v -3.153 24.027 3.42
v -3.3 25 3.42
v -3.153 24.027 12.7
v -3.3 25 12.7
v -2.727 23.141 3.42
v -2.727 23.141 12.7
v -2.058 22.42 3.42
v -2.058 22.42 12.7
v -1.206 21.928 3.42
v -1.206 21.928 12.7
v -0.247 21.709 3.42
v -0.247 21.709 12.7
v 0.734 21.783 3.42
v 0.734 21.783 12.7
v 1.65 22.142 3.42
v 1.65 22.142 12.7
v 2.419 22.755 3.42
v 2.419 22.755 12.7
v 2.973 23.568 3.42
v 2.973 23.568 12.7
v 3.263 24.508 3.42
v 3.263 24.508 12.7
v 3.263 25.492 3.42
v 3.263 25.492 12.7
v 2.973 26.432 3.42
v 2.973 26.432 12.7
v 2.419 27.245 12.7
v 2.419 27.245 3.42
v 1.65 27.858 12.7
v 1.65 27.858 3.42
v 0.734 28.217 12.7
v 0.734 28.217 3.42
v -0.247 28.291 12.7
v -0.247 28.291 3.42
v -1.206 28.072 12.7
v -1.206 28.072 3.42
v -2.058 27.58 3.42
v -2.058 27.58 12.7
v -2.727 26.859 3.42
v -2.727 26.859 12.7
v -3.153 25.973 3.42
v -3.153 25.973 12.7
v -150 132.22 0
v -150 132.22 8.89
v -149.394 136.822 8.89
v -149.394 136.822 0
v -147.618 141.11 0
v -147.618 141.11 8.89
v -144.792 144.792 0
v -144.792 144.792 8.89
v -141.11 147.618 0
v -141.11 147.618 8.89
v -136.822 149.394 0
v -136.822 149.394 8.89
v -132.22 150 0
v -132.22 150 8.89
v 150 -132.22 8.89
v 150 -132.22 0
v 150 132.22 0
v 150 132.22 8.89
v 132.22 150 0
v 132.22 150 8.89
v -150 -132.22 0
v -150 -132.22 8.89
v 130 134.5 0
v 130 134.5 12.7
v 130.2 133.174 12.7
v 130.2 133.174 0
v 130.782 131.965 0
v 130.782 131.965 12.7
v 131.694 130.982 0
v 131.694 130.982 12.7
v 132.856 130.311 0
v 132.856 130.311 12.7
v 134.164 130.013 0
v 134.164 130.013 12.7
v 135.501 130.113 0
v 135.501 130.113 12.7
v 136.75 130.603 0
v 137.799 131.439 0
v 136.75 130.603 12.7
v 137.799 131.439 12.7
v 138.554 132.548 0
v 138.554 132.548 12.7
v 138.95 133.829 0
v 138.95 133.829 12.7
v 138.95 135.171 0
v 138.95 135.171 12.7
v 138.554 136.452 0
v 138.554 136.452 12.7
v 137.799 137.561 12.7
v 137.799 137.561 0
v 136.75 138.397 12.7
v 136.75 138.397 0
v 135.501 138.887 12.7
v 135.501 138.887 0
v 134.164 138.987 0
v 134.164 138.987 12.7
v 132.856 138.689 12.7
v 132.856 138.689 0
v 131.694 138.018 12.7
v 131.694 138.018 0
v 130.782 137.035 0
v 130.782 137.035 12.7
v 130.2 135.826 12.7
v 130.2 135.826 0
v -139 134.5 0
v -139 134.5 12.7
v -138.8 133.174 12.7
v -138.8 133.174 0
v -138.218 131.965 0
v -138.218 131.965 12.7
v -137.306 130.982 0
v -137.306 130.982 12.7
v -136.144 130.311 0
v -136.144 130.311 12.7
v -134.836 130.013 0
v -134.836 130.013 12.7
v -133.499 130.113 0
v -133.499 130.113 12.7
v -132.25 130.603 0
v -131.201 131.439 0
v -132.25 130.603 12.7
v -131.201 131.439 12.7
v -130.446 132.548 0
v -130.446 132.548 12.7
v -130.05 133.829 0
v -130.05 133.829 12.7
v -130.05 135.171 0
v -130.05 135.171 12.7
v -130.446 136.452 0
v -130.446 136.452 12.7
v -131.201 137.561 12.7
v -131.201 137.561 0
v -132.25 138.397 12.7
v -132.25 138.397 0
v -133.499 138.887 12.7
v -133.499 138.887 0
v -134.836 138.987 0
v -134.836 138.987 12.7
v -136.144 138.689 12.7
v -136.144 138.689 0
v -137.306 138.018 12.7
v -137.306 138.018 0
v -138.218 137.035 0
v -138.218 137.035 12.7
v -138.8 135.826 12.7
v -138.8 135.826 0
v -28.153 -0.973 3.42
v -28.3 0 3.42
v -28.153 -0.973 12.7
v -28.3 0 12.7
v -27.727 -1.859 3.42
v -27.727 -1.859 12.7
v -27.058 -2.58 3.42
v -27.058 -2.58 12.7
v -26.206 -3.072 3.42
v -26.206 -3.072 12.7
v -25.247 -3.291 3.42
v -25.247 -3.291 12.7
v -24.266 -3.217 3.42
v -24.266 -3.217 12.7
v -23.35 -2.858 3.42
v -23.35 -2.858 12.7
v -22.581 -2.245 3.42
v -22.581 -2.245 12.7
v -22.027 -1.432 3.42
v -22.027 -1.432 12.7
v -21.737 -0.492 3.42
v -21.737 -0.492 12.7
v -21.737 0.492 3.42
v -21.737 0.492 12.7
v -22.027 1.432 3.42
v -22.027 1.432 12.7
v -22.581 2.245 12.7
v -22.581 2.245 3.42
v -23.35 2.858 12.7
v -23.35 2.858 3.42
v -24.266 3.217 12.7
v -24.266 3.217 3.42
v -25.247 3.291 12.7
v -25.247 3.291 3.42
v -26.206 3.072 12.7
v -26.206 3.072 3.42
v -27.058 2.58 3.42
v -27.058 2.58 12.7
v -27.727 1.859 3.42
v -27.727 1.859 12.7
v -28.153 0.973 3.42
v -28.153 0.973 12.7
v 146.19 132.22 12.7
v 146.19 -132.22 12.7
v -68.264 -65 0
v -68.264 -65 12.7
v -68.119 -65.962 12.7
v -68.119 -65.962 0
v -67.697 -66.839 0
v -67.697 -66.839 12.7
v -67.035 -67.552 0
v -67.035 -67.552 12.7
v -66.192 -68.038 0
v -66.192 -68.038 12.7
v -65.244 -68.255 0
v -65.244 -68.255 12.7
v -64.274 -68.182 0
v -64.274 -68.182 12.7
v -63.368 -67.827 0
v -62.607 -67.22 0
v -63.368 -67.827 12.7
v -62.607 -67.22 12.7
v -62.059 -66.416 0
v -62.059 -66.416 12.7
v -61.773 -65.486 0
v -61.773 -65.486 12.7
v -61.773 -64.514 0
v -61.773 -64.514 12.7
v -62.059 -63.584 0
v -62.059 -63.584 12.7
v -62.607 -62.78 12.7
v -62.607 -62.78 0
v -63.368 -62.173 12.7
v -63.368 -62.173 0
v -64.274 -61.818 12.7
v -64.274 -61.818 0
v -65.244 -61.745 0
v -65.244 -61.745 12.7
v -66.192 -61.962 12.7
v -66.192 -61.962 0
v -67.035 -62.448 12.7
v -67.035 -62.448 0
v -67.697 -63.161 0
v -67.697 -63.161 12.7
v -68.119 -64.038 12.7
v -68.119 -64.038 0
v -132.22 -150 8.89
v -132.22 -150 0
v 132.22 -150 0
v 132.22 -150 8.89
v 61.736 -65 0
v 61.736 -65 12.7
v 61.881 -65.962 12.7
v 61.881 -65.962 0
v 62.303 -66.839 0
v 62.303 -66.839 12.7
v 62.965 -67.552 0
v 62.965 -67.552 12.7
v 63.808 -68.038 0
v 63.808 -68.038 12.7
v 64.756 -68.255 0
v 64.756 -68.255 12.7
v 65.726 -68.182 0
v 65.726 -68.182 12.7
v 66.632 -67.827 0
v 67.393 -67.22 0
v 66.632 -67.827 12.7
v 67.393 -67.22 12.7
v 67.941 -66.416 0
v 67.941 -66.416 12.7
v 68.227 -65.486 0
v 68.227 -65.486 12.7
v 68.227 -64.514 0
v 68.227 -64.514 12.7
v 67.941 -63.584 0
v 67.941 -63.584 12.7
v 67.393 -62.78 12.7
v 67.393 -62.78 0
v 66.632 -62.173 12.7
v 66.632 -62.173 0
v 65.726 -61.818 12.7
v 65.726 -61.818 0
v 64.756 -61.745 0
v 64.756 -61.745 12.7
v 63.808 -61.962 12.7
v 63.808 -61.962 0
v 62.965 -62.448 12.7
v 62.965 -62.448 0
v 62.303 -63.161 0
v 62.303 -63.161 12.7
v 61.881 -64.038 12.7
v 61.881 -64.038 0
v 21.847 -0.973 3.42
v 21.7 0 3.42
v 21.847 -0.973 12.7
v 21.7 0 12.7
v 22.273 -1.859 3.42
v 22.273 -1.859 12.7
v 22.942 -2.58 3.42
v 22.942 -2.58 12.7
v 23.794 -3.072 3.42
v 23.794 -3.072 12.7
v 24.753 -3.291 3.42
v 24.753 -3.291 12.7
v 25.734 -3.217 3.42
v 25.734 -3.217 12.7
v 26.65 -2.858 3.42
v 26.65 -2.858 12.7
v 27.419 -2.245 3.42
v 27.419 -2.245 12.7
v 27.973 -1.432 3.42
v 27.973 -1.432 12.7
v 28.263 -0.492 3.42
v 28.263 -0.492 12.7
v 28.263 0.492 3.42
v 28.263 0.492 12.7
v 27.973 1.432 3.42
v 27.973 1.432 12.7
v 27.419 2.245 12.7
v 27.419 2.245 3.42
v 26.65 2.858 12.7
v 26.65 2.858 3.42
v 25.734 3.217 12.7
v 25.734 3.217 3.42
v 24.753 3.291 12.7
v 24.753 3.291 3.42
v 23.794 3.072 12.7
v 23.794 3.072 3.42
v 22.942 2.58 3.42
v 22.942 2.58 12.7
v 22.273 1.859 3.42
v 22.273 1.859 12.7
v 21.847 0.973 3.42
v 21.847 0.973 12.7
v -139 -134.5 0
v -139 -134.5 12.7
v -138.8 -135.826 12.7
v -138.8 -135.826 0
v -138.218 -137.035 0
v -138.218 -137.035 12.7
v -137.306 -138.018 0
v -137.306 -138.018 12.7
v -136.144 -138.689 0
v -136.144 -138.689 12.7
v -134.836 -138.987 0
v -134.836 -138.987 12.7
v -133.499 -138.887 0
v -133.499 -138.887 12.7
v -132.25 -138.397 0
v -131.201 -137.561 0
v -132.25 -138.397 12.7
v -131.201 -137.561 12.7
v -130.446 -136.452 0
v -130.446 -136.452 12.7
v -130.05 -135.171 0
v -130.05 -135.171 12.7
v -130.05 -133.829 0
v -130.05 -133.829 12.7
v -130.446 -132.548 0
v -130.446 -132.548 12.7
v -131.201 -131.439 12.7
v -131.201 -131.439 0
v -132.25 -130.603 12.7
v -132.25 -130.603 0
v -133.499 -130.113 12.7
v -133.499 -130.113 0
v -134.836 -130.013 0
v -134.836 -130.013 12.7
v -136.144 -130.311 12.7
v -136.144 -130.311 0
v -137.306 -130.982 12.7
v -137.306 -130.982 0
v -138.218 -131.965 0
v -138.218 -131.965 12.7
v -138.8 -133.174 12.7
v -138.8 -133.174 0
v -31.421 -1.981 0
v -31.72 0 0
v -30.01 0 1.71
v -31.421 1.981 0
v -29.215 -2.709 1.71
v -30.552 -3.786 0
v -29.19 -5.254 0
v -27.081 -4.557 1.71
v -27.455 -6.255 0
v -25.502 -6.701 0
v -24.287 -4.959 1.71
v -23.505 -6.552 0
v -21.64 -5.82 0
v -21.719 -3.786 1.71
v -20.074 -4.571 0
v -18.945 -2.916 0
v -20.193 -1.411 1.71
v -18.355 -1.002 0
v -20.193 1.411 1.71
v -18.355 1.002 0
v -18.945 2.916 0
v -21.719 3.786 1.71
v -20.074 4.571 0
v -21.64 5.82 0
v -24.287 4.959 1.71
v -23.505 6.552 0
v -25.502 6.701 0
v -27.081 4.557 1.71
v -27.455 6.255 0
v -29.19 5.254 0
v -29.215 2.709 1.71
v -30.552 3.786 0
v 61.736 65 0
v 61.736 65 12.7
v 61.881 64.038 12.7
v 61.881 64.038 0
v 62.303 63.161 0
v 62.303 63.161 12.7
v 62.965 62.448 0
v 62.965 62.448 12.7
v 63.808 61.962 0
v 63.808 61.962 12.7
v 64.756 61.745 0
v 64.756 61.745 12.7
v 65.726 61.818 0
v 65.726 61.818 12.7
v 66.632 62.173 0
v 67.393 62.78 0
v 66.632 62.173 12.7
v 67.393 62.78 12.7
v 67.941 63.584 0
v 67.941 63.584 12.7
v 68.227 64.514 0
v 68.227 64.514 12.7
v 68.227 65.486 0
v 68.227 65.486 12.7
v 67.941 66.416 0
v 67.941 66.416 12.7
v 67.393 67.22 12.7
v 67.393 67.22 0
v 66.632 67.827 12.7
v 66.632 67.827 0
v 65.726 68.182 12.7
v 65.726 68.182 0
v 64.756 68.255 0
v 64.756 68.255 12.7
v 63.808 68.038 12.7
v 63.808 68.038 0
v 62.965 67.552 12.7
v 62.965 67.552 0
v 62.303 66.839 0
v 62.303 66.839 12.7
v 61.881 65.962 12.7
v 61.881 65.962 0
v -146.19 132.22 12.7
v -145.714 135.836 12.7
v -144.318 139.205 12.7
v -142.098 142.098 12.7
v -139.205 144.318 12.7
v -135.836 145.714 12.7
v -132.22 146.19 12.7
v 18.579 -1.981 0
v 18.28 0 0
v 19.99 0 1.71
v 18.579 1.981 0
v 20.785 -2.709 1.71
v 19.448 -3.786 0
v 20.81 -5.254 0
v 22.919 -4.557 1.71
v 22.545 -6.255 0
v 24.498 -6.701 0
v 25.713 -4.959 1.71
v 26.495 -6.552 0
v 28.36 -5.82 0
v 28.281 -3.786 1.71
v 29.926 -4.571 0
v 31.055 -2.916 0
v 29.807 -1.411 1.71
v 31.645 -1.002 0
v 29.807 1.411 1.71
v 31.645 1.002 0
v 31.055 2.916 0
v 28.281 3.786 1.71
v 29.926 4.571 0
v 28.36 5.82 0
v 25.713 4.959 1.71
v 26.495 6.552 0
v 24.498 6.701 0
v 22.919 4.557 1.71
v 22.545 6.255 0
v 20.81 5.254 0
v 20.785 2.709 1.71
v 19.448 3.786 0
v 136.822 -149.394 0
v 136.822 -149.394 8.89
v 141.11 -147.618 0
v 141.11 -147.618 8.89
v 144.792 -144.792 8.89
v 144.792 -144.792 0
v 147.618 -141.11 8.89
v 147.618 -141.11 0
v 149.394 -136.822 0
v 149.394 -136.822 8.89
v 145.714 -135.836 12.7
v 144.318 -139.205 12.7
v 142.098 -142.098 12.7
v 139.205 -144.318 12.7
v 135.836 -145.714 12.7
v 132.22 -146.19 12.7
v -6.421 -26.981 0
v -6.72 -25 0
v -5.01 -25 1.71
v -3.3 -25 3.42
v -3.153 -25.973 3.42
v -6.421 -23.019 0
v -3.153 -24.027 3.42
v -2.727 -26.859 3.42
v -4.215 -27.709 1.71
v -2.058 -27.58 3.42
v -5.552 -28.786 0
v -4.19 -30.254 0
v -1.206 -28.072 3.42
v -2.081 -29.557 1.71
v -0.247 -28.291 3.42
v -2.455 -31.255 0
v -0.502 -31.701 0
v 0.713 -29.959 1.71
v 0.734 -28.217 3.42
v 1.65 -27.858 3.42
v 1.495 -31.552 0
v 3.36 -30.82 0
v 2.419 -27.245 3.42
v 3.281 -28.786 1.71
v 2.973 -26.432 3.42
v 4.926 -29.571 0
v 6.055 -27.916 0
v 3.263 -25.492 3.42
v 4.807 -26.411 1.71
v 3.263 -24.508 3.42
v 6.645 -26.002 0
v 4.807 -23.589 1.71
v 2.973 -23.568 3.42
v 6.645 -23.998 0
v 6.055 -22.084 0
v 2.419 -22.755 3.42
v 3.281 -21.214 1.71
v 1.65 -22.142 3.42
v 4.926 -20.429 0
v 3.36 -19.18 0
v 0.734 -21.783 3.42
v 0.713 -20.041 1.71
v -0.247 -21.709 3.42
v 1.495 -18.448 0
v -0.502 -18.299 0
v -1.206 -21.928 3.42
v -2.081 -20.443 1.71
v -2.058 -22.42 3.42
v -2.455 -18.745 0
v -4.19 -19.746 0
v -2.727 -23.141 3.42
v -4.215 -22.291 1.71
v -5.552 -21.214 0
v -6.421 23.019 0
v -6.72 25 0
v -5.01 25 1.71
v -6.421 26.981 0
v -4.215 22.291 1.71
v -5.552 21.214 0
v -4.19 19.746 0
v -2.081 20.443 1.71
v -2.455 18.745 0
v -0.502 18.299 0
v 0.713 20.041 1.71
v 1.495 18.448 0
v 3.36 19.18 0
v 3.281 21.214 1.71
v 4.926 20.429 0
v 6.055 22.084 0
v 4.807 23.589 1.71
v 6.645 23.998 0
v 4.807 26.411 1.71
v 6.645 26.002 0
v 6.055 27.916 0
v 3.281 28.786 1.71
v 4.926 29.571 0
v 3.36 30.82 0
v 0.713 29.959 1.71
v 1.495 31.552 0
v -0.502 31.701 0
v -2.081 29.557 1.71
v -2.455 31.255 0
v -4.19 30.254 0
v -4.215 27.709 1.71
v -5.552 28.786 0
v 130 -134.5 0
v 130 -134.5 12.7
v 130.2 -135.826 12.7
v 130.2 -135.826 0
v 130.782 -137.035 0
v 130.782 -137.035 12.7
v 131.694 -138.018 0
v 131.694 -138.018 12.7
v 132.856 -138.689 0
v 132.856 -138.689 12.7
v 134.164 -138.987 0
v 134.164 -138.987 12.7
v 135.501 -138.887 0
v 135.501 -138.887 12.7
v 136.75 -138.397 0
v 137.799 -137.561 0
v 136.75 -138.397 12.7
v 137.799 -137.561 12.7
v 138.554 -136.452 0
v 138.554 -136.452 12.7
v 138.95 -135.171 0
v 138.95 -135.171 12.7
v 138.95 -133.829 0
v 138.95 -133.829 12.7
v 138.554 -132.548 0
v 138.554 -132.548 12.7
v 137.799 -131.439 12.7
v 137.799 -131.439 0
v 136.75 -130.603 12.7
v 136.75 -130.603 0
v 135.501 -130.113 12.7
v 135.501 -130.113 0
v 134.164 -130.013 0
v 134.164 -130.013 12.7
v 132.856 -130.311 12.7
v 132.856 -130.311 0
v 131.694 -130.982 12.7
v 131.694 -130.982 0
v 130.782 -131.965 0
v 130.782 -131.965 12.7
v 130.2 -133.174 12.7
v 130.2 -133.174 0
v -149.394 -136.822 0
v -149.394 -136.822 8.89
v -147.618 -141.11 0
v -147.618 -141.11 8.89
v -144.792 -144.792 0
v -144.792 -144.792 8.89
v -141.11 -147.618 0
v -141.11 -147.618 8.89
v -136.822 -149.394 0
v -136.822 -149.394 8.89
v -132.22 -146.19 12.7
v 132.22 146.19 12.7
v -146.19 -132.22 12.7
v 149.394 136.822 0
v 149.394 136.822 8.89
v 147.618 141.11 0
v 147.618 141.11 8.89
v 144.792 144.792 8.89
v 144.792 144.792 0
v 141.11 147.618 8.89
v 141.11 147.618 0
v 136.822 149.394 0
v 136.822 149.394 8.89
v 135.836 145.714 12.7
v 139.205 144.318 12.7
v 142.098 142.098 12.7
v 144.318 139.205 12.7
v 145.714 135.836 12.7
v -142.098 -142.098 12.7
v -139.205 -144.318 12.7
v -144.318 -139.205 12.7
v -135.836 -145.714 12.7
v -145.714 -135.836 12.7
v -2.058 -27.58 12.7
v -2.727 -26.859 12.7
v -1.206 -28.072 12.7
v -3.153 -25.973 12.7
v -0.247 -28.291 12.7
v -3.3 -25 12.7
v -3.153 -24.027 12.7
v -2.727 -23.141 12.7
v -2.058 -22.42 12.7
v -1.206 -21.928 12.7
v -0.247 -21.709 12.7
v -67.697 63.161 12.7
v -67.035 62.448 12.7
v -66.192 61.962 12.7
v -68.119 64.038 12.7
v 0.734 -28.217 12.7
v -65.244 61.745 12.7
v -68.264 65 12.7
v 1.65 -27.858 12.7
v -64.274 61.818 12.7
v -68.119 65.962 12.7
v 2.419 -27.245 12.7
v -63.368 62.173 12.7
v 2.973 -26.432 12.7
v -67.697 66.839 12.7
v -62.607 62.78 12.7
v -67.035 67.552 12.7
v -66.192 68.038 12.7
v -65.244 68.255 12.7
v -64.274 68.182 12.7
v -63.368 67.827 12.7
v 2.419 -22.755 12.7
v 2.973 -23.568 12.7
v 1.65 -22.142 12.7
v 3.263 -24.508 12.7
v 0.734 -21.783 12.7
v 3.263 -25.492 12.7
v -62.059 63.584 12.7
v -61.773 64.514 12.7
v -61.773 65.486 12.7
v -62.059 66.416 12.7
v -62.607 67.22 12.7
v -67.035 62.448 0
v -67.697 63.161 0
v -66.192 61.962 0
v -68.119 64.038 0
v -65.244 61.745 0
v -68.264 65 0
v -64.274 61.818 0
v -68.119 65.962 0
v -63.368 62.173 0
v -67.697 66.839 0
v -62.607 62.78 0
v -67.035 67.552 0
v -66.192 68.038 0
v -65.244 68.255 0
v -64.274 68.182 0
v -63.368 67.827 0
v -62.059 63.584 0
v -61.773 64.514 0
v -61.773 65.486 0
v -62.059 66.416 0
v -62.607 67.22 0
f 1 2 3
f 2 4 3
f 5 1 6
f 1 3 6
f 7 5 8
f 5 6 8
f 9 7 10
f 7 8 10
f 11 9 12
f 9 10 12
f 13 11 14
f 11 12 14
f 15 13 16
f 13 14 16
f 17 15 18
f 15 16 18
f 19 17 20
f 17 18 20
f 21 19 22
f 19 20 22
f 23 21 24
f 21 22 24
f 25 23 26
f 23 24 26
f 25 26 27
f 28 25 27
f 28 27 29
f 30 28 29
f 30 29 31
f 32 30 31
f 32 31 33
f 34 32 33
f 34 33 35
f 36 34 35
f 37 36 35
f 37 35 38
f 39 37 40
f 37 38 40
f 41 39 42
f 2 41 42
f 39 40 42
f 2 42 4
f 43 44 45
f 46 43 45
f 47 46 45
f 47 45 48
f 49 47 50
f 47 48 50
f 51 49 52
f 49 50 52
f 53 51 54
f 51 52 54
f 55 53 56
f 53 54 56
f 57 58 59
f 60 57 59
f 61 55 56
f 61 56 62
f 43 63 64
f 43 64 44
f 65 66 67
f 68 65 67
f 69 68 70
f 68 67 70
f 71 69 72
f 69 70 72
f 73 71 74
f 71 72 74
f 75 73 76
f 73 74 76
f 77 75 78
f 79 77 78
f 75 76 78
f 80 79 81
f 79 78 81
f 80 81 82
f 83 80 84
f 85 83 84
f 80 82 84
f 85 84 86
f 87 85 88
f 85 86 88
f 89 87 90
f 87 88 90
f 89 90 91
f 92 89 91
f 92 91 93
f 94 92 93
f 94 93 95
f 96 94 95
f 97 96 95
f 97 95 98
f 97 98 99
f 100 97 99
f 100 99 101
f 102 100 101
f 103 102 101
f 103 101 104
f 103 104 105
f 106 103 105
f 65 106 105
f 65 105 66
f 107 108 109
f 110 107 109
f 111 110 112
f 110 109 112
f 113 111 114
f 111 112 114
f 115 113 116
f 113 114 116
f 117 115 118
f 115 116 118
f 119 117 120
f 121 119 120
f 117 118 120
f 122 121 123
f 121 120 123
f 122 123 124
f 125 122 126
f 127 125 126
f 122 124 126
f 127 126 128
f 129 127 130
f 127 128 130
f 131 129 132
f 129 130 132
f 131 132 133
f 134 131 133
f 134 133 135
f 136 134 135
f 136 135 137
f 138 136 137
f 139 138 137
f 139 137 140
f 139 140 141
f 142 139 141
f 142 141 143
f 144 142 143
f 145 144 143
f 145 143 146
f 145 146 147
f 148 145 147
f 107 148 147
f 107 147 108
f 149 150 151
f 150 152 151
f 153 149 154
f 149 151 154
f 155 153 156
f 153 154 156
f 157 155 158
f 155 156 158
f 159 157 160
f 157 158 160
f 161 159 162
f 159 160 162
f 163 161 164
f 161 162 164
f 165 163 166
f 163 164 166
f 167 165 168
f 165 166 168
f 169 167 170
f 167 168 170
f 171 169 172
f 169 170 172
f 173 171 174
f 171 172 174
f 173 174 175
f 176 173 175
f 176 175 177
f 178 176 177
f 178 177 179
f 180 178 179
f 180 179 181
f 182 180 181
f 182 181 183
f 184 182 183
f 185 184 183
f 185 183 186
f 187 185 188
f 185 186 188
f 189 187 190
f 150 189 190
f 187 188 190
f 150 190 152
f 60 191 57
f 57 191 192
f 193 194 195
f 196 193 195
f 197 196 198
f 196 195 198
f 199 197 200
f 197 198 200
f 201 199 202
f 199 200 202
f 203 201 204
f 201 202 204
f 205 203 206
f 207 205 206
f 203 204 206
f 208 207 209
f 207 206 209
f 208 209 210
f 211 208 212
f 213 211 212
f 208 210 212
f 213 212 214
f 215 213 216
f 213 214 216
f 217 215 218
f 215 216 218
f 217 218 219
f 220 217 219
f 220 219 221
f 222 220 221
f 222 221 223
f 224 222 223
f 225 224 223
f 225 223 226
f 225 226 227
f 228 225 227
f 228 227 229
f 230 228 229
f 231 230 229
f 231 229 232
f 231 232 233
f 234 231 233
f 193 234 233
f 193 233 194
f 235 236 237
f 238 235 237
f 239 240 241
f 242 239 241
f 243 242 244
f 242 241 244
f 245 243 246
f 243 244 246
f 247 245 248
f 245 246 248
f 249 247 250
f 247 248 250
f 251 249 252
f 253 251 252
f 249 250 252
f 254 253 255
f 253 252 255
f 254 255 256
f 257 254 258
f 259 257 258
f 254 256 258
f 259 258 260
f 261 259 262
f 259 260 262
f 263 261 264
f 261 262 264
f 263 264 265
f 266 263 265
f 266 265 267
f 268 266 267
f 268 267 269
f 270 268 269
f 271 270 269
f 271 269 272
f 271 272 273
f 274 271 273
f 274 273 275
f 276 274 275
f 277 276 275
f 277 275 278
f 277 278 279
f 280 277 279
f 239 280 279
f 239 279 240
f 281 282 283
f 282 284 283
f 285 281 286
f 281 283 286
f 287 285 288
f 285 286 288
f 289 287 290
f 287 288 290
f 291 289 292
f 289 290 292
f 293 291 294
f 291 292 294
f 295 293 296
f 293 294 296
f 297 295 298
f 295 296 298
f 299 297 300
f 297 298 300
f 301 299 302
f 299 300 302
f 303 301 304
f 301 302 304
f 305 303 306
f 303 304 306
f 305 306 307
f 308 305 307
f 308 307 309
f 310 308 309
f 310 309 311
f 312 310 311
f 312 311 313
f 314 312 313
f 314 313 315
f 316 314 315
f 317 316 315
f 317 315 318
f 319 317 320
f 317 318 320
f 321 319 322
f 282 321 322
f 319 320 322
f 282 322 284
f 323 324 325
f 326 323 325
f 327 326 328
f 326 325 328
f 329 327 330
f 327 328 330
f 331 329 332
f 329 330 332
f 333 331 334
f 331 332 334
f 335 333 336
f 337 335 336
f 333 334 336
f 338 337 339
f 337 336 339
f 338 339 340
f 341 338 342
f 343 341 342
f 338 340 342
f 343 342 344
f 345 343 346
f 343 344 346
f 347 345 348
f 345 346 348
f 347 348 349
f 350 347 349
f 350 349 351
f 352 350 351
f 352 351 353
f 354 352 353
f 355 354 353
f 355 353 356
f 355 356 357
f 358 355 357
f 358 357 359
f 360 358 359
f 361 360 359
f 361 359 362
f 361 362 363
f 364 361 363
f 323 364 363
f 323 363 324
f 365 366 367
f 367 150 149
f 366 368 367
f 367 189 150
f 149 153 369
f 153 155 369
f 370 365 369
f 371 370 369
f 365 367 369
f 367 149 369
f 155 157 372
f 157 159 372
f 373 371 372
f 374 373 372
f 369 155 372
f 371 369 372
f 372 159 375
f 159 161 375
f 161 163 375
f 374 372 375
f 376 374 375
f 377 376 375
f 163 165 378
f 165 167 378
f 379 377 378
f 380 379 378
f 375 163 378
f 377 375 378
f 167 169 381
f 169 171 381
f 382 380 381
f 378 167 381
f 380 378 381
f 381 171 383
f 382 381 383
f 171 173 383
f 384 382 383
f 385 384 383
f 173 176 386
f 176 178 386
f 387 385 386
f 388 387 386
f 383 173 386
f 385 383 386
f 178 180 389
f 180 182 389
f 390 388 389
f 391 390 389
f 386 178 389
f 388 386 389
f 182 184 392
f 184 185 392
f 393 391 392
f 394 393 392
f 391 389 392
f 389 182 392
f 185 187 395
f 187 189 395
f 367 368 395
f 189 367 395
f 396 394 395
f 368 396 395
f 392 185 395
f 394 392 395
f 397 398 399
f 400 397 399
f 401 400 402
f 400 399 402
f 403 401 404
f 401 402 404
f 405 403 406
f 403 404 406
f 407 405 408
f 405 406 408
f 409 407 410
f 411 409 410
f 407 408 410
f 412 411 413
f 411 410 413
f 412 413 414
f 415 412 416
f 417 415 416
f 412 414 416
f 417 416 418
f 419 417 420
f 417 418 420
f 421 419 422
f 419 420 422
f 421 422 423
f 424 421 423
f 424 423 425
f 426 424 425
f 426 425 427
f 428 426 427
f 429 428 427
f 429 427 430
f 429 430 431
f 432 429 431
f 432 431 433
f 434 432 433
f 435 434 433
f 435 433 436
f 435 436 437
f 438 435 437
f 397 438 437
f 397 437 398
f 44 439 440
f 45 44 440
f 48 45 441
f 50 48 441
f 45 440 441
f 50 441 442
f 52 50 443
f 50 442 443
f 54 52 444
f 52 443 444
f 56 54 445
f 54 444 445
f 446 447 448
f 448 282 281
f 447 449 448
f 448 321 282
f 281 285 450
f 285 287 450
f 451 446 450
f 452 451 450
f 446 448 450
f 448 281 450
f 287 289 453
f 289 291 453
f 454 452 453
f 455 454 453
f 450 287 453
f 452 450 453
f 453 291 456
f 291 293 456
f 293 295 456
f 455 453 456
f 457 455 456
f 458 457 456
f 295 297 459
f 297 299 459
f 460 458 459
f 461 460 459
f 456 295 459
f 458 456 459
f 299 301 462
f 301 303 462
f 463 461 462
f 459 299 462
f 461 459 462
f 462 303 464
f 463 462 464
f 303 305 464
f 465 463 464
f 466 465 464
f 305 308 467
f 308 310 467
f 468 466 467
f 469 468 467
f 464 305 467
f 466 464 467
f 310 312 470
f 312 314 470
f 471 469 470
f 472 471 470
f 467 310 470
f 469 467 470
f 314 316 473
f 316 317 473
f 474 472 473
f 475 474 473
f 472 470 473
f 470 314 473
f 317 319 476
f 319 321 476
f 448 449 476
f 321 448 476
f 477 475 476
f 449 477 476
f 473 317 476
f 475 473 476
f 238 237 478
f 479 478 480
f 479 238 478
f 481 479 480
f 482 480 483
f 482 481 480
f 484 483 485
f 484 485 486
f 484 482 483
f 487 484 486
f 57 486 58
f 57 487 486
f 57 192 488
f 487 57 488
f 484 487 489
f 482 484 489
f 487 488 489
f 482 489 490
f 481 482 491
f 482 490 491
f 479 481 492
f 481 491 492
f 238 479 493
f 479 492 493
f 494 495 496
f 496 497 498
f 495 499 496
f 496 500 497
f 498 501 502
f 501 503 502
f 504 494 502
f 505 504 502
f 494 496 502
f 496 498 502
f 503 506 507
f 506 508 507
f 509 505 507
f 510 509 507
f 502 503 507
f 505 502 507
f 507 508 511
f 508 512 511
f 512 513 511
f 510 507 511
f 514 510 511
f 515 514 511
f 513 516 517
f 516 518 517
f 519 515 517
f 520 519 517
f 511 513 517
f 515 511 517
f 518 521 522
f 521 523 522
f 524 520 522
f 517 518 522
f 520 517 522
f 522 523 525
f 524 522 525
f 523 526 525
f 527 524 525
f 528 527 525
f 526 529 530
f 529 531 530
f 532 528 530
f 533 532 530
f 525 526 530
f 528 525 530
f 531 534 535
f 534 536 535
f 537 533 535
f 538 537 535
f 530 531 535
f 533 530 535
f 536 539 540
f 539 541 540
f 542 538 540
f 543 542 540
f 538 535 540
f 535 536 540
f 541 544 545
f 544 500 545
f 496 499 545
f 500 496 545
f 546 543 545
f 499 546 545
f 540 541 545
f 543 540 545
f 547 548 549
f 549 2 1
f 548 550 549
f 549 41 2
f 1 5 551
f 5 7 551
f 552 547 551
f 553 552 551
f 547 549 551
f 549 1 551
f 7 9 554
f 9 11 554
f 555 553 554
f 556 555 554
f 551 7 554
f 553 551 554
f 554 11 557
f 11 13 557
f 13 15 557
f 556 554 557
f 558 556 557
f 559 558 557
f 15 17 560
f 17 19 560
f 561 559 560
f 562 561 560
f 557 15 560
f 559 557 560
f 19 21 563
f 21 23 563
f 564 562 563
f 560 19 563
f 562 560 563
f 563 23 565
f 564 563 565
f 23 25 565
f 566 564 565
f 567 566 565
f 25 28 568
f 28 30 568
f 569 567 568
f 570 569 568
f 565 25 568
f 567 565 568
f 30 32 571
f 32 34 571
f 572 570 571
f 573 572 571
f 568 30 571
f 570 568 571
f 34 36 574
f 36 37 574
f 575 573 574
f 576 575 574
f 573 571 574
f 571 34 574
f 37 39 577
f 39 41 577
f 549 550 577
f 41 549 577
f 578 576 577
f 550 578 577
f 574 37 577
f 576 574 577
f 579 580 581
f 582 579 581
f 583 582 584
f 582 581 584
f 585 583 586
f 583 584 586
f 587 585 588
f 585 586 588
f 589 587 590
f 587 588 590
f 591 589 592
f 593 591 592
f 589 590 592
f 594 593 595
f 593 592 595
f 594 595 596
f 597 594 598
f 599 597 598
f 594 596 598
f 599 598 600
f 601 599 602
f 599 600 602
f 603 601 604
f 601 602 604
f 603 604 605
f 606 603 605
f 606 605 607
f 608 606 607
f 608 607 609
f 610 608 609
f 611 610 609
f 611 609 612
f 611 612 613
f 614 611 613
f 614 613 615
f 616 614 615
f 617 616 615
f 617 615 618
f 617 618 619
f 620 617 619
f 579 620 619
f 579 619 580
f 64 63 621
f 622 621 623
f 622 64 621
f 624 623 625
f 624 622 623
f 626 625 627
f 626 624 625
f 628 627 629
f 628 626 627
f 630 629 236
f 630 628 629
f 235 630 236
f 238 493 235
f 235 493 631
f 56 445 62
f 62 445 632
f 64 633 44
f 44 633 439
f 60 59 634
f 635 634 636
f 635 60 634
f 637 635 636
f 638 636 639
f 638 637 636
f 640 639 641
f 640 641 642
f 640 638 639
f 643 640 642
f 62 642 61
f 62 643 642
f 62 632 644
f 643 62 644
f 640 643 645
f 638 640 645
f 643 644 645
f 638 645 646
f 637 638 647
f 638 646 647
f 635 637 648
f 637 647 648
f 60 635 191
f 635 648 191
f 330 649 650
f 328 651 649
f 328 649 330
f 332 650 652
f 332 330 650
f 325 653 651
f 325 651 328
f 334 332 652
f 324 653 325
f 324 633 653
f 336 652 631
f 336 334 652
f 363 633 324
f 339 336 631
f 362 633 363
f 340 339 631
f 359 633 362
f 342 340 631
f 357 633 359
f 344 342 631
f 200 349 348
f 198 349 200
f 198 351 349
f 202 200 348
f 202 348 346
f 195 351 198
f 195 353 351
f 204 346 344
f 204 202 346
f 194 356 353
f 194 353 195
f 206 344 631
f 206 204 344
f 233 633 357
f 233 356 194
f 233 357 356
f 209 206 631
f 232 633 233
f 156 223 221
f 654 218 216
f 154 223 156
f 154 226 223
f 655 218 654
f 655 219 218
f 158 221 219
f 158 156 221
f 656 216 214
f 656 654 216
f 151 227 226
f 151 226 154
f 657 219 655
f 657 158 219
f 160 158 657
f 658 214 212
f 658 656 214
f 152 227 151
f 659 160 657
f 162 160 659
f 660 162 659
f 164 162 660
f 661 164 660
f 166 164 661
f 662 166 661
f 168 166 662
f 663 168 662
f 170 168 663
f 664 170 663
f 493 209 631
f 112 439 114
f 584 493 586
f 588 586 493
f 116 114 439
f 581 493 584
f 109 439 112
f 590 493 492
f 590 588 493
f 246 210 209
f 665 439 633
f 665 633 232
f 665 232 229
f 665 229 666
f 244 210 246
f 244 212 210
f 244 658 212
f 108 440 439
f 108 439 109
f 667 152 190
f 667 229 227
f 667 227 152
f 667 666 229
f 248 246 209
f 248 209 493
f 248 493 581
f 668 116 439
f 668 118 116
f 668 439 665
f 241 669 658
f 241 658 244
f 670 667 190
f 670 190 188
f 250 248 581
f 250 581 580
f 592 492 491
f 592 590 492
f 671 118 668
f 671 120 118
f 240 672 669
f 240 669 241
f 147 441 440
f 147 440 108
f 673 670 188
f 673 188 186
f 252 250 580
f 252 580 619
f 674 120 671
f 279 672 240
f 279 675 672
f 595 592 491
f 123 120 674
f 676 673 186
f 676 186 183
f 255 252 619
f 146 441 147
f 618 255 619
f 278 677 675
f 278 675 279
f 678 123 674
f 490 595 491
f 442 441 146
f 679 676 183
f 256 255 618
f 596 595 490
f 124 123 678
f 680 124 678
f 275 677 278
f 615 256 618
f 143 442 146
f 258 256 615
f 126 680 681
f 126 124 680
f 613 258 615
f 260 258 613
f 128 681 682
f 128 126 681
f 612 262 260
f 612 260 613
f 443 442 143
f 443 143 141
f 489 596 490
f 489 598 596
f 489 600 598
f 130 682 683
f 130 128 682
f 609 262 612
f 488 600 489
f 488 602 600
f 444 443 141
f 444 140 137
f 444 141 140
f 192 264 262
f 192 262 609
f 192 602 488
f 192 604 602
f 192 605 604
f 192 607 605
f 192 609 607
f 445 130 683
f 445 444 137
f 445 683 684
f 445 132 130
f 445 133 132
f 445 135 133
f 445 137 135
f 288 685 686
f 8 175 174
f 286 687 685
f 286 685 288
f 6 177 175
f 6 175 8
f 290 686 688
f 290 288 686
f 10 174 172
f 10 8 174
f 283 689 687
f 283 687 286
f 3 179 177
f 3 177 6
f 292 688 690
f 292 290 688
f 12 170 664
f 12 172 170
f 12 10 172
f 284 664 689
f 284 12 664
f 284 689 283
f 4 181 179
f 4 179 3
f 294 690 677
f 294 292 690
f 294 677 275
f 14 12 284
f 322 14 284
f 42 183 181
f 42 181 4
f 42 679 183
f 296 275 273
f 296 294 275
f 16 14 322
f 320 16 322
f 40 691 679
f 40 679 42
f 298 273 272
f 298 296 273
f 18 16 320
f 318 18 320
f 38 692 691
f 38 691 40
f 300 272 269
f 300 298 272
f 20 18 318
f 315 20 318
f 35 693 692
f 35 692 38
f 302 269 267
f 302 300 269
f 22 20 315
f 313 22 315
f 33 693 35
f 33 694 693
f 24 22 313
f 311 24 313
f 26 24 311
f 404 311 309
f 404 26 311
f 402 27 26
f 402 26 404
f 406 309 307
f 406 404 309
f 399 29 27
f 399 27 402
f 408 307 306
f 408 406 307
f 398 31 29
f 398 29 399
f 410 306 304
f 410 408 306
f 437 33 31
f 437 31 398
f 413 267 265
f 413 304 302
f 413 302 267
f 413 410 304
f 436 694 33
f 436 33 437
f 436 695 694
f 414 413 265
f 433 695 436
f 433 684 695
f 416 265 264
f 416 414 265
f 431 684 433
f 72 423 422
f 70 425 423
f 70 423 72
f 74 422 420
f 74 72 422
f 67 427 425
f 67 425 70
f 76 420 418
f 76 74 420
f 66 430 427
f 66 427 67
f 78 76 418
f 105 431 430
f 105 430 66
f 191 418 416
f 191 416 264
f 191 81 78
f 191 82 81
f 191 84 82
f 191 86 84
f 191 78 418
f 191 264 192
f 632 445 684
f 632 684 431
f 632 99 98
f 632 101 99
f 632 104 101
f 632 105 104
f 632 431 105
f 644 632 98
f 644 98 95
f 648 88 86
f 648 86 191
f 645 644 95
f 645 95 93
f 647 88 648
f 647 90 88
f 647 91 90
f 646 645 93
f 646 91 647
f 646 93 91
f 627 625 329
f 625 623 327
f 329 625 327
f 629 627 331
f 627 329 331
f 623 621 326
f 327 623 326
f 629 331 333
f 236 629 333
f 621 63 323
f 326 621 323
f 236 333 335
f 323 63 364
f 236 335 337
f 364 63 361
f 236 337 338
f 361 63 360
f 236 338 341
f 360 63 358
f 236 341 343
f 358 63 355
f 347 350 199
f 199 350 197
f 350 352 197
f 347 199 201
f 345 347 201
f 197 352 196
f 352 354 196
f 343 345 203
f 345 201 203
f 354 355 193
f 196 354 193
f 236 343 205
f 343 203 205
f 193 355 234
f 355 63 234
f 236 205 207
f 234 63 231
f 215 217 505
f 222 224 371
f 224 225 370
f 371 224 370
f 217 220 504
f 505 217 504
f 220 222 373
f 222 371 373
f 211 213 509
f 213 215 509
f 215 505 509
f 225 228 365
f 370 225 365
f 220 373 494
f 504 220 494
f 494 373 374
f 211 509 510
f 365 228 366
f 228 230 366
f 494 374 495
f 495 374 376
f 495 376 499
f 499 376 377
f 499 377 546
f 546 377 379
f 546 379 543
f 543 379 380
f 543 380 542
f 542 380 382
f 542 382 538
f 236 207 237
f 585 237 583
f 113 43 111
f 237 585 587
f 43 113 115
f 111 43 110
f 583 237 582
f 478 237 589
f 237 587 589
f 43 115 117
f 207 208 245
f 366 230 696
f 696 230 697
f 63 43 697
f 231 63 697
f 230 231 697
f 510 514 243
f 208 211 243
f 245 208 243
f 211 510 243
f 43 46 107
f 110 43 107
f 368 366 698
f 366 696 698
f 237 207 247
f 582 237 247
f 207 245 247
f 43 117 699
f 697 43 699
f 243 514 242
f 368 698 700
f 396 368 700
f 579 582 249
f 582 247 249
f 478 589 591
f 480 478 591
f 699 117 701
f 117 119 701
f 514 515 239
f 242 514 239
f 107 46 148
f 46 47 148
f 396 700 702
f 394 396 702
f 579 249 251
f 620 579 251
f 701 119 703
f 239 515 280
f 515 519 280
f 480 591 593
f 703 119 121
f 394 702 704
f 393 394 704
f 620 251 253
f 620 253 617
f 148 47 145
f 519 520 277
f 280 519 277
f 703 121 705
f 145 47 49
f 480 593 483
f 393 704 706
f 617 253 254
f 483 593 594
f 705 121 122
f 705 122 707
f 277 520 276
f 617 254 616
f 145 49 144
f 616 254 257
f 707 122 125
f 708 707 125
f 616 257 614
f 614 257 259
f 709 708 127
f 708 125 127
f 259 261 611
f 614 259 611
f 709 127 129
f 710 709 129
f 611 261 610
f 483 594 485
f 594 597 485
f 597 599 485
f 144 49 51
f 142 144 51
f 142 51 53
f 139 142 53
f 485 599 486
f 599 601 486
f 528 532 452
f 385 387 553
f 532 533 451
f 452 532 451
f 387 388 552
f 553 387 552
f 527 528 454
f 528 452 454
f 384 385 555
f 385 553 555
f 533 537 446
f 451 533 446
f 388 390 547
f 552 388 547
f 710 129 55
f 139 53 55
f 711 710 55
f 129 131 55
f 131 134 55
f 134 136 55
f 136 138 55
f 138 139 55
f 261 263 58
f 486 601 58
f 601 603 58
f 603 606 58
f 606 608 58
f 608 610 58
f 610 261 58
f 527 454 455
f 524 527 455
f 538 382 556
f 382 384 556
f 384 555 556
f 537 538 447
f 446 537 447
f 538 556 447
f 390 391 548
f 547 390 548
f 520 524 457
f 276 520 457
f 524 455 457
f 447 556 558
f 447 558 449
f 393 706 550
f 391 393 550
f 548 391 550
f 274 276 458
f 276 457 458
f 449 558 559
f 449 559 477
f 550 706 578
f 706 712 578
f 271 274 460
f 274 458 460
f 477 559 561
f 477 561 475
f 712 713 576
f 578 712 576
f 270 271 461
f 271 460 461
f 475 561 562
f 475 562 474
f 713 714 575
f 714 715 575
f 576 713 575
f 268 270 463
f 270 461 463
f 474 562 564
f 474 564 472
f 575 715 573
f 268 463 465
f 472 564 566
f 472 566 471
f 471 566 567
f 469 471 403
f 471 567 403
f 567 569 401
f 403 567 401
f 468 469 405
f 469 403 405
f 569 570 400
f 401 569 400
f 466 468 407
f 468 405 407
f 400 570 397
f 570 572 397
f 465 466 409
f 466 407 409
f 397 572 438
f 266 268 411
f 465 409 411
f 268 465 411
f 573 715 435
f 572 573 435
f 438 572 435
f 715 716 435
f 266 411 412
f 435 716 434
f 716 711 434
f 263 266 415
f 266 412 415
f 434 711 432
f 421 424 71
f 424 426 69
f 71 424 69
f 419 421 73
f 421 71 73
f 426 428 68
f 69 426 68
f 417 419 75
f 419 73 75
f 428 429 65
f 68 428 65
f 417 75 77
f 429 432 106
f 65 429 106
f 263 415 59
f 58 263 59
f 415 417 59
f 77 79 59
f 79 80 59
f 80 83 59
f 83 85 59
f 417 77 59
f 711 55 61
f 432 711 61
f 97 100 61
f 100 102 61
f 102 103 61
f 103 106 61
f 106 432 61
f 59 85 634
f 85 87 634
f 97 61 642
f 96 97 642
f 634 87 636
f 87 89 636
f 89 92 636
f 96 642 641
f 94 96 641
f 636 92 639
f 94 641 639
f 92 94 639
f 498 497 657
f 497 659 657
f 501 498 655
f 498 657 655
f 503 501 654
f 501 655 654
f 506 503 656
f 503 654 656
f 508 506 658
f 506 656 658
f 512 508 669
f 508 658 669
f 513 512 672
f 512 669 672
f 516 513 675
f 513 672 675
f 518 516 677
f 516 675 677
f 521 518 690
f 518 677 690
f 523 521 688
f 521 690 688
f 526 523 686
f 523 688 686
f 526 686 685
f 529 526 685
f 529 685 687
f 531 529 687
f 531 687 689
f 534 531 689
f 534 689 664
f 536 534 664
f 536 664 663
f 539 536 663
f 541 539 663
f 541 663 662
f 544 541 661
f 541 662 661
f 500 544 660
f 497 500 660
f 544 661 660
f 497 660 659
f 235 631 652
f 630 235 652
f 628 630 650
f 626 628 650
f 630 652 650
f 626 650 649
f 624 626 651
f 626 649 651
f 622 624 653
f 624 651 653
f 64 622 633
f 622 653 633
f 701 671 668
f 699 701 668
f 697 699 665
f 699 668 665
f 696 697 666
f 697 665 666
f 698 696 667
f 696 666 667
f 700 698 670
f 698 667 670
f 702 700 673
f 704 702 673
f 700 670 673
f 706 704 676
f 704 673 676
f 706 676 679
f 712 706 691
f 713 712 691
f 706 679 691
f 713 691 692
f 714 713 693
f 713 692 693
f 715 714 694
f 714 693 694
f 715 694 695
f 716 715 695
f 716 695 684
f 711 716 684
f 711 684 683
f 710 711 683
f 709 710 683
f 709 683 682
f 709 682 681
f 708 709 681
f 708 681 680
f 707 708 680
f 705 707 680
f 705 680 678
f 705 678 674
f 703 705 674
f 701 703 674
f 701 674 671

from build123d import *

# Parameters (mm, degrees)
F0_W           = 300
F0_H           = 300
F1_DEPTH       = 12.7
F2_R           = 17.78
F3_SIZE        = 3.81
F5_D           = 9
F7_D           = 6.5278
F9_D           = 6.6
F9_CSINK_D     = 13.44
F9_CSINK_ANGLE = 90


with BuildPart() as f1:
    # F0 (on Top) → F1 (new body)
    with BuildSketch(Plane.XY):
        Rectangle(F0_W, F0_H)
    extrude(amount=F1_DEPTH)

    # F2
    f2_edges = [f1.edges().sort_by_distance(p)[0] for p in [
        (-150, -150, 6.35),
        (150, -150, 6.35),
        (150, 150, 6.35),
        (-150, 150, 6.35),
    ]]
    fillet(f2_edges, radius=F2_R)

    # F3
    f3_edges = [f1.edges().sort_by_distance(p)[0] for p in [
        (-150, 0, 12.7),
        (0, 150, 12.7),
        (150, 0, 12.7),
        (0, -150, 12.7),
        (144.792359, -144.792359, 12.7),
        (144.792359, 144.792359, 12.7),
        (-144.792359, -144.792359, 12.7),
        (-144.792359, 144.792359, 12.7),
    ]]
    chamfer(f3_edges, length=F3_SIZE)

    # F5 (through all)
    with Locations(Plane(origin=(0, 0, 0), x_dir=(1, 0, 0), z_dir=(0, 0, -1))):
        with Locations((-134.5, 134.5), (134.5, 134.5), (-134.5, -134.5), (134.5, -134.5)):
            Hole(F5_D / 2)

    # F7 (through all)
    with Locations(Plane(origin=(0, 0, 0), x_dir=(1, 0, 0), z_dir=(0, 0, -1))):
        with Locations((-65, 65), (65, 65), (65, -65), (-65, -65)):
            Hole(F7_D / 2)

    # F9 (through all)
    with Locations(Plane(origin=(0, 0, 0), x_dir=(1, 0, 0), z_dir=(0, 0, -1))):
        with Locations((0, 25), (25, 0), (0, -25), (-25, 0)):
            CounterSinkHole(F9_D / 2, F9_CSINK_D / 2, counter_sink_angle=F9_CSINK_ANGLE)


solid = f1.part
